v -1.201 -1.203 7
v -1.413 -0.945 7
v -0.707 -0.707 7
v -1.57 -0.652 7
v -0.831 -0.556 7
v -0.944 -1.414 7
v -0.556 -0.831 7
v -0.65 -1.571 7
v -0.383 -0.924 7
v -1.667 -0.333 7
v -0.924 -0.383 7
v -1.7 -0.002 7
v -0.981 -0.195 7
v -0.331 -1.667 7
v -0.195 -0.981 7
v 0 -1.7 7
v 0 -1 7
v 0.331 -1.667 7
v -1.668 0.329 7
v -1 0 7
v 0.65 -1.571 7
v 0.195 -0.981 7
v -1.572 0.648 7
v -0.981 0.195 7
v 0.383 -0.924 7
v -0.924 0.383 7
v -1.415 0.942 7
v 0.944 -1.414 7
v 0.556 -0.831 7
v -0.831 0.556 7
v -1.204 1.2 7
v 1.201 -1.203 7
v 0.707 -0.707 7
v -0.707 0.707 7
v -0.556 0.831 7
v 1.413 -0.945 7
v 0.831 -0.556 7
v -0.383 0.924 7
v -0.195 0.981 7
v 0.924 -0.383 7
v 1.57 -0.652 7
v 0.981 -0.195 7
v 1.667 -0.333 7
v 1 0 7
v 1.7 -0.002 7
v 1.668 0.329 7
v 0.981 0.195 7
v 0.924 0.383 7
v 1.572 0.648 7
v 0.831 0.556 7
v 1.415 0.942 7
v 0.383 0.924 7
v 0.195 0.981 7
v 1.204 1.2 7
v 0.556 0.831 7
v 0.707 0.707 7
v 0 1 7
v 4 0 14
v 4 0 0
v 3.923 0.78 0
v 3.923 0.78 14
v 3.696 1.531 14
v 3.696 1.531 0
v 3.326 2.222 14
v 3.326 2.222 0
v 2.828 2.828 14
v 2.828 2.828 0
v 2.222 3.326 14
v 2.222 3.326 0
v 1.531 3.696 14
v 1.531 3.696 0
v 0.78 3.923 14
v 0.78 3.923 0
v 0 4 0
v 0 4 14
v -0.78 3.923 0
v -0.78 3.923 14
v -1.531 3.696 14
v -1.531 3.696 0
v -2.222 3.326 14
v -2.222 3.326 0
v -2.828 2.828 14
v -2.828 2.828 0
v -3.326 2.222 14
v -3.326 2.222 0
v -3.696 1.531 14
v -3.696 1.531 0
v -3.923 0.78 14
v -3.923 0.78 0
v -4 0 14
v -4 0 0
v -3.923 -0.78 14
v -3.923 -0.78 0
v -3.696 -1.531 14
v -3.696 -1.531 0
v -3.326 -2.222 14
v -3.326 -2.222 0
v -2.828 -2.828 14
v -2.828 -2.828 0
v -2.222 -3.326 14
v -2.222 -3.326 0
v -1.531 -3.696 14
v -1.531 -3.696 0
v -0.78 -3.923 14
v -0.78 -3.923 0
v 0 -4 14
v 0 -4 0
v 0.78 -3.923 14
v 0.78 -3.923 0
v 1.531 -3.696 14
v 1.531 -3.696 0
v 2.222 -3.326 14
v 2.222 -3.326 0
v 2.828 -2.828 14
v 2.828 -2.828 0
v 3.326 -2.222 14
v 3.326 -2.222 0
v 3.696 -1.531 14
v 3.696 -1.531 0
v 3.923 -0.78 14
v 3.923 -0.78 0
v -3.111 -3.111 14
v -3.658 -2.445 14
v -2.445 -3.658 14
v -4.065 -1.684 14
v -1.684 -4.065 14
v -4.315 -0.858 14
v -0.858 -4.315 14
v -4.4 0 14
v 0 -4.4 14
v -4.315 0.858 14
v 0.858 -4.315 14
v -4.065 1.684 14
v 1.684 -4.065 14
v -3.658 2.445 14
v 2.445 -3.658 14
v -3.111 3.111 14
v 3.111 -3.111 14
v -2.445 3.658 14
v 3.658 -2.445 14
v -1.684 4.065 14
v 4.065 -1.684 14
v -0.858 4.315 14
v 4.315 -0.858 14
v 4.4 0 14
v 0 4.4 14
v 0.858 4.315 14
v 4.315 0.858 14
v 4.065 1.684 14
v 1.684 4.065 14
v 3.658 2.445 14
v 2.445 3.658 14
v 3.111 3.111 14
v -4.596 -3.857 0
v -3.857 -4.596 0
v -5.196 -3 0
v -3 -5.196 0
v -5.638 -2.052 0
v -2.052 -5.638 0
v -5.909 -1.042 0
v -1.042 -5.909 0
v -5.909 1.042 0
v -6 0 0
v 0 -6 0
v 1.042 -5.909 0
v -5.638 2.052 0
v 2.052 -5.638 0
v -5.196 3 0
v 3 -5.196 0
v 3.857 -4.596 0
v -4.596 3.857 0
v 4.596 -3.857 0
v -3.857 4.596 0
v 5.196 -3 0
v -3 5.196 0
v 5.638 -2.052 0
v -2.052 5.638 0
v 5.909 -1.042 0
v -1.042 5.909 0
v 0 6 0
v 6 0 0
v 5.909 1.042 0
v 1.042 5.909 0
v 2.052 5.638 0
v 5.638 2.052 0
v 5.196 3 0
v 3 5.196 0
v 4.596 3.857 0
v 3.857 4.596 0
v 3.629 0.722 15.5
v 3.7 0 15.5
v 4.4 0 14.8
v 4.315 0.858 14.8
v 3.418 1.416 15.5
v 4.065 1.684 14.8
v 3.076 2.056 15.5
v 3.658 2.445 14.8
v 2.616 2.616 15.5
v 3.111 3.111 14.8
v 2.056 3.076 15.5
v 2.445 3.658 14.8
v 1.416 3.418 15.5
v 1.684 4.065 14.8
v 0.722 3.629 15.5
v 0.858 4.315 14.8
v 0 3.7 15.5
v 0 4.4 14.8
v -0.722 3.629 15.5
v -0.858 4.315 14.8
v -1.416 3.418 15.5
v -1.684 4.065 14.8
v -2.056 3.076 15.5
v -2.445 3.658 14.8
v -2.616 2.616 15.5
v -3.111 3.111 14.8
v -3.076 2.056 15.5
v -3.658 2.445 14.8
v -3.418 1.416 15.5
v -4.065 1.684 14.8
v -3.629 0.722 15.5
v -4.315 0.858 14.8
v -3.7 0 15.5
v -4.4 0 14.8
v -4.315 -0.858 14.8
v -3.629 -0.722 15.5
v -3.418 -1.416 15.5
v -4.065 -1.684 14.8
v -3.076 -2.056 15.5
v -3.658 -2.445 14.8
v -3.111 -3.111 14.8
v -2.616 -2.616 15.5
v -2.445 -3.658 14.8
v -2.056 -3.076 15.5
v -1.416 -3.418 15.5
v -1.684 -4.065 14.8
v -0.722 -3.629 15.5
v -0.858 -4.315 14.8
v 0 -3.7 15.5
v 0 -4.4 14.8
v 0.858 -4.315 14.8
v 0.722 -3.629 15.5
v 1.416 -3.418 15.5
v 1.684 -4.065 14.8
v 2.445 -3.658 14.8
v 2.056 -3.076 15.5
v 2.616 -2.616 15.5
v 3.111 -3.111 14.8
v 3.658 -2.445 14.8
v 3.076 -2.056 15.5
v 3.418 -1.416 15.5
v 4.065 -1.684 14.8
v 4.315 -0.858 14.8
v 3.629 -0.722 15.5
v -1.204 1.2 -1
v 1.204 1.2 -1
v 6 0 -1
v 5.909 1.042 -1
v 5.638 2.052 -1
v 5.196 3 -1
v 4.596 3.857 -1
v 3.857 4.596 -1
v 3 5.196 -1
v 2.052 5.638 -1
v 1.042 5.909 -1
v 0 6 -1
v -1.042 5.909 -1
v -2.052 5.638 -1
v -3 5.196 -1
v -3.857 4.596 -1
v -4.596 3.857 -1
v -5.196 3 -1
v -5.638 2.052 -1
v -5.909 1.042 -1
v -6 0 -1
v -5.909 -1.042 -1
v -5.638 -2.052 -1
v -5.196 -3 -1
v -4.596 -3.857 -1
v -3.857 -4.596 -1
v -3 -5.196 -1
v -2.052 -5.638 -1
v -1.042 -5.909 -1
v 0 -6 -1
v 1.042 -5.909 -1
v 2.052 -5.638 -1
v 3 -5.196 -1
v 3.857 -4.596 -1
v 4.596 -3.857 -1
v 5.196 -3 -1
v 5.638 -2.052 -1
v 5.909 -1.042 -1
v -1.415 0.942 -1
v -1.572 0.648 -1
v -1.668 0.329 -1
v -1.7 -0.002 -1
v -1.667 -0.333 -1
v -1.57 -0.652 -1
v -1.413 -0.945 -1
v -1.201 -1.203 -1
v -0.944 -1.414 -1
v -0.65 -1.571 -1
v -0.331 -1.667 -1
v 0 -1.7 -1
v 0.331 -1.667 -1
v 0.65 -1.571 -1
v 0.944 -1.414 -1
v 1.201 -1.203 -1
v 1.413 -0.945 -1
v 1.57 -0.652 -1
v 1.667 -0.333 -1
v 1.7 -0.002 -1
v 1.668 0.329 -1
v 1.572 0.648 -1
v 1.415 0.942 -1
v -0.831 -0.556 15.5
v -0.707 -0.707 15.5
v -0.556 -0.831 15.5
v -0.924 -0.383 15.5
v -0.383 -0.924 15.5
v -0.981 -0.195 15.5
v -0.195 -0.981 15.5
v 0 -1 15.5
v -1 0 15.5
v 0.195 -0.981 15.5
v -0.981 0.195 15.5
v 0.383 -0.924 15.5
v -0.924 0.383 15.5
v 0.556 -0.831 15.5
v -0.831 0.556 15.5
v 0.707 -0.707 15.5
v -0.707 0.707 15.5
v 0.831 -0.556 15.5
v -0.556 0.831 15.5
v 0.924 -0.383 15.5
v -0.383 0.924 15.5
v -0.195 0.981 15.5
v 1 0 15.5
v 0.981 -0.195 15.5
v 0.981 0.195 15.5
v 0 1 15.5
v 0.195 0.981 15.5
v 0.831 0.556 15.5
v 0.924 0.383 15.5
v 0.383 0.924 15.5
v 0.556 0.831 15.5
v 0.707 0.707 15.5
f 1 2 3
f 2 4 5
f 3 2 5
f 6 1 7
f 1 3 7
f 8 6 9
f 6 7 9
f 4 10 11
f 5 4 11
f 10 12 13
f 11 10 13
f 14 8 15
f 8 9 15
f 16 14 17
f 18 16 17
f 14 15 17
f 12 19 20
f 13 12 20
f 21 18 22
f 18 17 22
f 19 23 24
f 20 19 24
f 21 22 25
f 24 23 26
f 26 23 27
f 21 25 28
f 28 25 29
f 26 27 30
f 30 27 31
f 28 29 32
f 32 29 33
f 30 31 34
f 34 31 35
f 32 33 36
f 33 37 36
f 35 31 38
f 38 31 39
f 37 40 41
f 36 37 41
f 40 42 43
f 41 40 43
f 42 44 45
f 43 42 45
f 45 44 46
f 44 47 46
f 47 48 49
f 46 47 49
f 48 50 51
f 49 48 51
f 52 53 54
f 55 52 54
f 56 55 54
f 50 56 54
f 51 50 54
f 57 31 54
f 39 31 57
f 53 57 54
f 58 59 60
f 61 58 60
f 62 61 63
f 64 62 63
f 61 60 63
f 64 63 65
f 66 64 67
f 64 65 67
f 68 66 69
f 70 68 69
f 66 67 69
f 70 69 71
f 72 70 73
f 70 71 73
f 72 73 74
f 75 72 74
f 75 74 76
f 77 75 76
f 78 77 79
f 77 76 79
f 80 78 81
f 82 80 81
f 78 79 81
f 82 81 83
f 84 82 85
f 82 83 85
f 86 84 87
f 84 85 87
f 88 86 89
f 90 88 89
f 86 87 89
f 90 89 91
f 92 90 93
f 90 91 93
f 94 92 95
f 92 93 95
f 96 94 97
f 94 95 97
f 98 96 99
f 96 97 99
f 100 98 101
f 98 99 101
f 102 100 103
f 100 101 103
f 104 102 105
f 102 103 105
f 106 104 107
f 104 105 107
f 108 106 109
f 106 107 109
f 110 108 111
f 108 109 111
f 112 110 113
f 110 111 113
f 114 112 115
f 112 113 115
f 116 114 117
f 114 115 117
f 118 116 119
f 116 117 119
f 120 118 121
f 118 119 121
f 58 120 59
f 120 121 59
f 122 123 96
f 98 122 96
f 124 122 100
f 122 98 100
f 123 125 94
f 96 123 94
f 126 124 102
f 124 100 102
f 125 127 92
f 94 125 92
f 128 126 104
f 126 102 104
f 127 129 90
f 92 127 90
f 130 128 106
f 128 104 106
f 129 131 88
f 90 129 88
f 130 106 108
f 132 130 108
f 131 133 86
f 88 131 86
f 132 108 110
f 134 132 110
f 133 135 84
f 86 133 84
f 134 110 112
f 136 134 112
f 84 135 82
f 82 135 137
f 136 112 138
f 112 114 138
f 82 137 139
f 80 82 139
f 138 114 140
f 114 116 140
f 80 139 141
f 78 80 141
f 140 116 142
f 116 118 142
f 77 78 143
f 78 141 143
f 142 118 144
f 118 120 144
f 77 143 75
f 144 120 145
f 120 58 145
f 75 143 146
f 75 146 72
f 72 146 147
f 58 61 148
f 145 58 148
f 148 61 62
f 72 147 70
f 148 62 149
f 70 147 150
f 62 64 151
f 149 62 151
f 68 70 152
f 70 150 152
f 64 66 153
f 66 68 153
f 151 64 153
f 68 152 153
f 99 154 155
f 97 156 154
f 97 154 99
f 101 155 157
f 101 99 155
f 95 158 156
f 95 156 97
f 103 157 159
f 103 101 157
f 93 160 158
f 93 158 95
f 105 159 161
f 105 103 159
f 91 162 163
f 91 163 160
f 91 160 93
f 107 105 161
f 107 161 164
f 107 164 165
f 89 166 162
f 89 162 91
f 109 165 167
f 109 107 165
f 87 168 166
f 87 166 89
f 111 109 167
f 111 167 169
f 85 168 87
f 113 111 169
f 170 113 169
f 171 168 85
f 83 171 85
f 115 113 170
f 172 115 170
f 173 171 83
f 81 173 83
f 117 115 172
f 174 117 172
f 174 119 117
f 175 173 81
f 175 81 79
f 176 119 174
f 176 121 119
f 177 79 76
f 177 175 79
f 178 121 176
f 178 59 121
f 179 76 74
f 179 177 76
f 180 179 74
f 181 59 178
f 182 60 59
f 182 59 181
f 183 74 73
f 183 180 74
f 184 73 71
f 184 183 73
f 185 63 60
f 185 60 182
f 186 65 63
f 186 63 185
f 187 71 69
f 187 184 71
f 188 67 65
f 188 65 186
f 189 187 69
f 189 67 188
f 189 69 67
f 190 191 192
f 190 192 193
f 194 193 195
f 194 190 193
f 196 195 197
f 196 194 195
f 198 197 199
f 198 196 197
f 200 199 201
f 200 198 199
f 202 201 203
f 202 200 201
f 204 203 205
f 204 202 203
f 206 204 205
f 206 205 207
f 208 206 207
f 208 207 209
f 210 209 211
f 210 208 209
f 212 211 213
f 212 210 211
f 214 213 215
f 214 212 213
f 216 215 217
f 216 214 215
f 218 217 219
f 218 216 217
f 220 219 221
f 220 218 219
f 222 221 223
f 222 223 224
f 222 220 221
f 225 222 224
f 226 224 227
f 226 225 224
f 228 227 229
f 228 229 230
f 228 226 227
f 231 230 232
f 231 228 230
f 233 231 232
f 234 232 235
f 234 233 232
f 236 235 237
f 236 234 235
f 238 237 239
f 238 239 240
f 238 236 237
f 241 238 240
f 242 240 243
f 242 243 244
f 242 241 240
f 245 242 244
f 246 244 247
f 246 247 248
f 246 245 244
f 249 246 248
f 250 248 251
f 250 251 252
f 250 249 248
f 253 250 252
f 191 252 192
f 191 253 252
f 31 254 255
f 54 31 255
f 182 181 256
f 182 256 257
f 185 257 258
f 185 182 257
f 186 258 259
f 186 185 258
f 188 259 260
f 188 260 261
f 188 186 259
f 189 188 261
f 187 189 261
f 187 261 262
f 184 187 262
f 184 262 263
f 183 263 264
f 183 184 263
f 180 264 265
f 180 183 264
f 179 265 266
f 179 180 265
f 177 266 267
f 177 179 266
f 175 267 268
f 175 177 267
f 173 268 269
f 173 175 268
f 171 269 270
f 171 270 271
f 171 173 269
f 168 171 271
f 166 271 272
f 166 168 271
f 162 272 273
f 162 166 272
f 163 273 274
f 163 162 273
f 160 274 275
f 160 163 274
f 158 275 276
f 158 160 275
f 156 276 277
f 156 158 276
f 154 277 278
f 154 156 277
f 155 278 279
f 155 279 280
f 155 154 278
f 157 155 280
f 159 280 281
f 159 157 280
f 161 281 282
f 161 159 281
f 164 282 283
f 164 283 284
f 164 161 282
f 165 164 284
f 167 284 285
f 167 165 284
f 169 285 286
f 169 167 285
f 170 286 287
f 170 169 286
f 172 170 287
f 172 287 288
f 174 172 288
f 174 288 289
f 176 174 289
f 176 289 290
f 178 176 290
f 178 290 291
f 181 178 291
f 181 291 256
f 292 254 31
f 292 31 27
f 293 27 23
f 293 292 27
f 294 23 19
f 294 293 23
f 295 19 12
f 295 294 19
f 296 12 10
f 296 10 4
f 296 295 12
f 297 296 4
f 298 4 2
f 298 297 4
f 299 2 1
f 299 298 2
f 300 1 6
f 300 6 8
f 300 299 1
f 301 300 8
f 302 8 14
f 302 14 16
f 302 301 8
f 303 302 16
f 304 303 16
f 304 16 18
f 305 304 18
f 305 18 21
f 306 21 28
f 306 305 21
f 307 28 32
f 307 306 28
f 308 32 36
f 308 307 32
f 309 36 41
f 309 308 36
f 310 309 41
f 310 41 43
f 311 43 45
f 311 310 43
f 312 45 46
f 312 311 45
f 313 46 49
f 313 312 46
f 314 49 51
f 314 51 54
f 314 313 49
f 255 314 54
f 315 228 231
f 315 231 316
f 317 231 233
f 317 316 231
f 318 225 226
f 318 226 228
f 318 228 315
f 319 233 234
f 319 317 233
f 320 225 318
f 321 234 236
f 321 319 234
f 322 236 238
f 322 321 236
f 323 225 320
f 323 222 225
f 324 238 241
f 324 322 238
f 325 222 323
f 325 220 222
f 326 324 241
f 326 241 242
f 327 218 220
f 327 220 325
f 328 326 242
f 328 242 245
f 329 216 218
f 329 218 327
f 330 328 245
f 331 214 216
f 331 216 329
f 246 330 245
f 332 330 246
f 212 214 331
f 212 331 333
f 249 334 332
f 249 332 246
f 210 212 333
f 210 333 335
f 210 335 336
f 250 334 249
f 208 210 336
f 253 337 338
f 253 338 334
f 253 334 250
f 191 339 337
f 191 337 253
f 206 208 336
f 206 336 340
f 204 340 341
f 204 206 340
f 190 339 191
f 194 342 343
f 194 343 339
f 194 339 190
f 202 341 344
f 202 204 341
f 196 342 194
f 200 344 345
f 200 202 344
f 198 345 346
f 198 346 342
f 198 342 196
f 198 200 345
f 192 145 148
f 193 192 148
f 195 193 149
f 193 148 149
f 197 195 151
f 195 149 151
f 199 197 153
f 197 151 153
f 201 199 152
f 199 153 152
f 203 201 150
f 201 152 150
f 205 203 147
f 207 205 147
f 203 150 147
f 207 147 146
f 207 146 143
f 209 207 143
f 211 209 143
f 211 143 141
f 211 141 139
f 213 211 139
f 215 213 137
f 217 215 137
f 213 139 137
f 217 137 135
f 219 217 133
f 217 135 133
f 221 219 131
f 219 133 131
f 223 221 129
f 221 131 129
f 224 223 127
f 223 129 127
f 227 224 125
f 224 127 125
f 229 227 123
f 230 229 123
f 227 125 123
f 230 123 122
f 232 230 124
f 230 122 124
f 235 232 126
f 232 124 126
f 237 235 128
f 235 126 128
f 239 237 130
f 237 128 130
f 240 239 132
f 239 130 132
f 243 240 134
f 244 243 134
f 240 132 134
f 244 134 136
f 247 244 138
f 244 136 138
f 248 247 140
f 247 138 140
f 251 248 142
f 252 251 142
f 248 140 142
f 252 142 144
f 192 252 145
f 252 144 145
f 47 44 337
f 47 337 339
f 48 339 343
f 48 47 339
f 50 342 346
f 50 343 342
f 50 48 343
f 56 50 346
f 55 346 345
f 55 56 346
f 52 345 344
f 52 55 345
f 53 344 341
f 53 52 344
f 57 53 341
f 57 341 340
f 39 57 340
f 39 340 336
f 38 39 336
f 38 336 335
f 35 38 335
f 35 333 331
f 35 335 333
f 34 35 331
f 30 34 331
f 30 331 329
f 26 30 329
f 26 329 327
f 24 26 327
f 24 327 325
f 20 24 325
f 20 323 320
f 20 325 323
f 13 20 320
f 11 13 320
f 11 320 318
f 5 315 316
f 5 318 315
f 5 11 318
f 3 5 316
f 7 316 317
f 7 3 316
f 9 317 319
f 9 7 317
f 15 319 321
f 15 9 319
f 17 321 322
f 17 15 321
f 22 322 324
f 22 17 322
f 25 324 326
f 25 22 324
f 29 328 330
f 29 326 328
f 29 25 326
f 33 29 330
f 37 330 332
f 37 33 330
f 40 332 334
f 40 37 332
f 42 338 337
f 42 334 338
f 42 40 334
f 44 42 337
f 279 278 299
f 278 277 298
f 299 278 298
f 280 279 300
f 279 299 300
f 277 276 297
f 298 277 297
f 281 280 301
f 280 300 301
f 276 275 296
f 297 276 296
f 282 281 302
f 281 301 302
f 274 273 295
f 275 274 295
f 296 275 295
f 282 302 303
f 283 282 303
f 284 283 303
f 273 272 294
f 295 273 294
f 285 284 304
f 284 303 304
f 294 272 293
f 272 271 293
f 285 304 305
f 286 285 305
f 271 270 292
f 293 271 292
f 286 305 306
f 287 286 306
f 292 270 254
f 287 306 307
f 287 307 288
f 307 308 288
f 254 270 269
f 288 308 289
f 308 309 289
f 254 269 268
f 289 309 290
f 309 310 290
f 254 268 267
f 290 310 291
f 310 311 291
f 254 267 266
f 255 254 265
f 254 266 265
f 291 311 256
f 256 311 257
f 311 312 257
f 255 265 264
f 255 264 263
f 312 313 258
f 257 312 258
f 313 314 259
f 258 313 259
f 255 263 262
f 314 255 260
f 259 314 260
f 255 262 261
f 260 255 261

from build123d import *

# Parameters (mm, degrees)
SKETCH_R             = 4
PAD_DEPTH            = 14
SKETCH001_R          = 4.4
PAD001_DEPTH         = 1.5
CHAMFER_SIZE         = 0.7
SKETCH002_R          = 6
PAD002_DEPTH         = 1
POCKET_DEPTH         = 8
SKETCH004_R          = 1
POCKET001_DEPTH      = 1.001
POCKET001_DEPTH_BACK = -15.501


with BuildPart() as part:
    # Sketch → Pad (new body)
    with BuildSketch(Plane.XY):
        Circle(SKETCH_R)
    extrude(amount=PAD_DEPTH)

    # Sketch001 (on Face3 of Pad) → Pad001 (join)
    with BuildSketch(Plane.XY.offset(14)):
        Circle(SKETCH001_R)
    extrude(amount=PAD001_DEPTH)

    # Chamfer
    chamfer_edges = [part.edges().sort_by_distance(p)[0] for p in [
        (-4.4, 0, 15.5),
    ]]
    chamfer(chamfer_edges, length=CHAMFER_SIZE)

    # Sketch002 → Pad002 (join)
    with BuildSketch(Plane.XY):
        Circle(SKETCH002_R)
    extrude(amount=-PAD002_DEPTH)

    # Sketch003 → Pocket (cut)
    with BuildSketch(Plane.XY.offset(-1)):
        with BuildLine():
            ThreePointArc((-1.204159, 1.2), (0, -1.7), (1.204159, 1.2))
            Line((-1.204159, 1.2), (1.204159, 1.2))
        make_face()
    extrude(amount=POCKET_DEPTH, mode=Mode.SUBTRACT)

    # Sketch004 → Pocket001 (cut, two sides)
    with BuildSketch(Plane.XY) as pocket001_sk:
        Circle(SKETCH004_R)
    extrude(amount=-POCKET001_DEPTH, mode=Mode.SUBTRACT)
    extrude(pocket001_sk.sketch, amount=-POCKET001_DEPTH_BACK, mode=Mode.SUBTRACT)


solid = part.part
